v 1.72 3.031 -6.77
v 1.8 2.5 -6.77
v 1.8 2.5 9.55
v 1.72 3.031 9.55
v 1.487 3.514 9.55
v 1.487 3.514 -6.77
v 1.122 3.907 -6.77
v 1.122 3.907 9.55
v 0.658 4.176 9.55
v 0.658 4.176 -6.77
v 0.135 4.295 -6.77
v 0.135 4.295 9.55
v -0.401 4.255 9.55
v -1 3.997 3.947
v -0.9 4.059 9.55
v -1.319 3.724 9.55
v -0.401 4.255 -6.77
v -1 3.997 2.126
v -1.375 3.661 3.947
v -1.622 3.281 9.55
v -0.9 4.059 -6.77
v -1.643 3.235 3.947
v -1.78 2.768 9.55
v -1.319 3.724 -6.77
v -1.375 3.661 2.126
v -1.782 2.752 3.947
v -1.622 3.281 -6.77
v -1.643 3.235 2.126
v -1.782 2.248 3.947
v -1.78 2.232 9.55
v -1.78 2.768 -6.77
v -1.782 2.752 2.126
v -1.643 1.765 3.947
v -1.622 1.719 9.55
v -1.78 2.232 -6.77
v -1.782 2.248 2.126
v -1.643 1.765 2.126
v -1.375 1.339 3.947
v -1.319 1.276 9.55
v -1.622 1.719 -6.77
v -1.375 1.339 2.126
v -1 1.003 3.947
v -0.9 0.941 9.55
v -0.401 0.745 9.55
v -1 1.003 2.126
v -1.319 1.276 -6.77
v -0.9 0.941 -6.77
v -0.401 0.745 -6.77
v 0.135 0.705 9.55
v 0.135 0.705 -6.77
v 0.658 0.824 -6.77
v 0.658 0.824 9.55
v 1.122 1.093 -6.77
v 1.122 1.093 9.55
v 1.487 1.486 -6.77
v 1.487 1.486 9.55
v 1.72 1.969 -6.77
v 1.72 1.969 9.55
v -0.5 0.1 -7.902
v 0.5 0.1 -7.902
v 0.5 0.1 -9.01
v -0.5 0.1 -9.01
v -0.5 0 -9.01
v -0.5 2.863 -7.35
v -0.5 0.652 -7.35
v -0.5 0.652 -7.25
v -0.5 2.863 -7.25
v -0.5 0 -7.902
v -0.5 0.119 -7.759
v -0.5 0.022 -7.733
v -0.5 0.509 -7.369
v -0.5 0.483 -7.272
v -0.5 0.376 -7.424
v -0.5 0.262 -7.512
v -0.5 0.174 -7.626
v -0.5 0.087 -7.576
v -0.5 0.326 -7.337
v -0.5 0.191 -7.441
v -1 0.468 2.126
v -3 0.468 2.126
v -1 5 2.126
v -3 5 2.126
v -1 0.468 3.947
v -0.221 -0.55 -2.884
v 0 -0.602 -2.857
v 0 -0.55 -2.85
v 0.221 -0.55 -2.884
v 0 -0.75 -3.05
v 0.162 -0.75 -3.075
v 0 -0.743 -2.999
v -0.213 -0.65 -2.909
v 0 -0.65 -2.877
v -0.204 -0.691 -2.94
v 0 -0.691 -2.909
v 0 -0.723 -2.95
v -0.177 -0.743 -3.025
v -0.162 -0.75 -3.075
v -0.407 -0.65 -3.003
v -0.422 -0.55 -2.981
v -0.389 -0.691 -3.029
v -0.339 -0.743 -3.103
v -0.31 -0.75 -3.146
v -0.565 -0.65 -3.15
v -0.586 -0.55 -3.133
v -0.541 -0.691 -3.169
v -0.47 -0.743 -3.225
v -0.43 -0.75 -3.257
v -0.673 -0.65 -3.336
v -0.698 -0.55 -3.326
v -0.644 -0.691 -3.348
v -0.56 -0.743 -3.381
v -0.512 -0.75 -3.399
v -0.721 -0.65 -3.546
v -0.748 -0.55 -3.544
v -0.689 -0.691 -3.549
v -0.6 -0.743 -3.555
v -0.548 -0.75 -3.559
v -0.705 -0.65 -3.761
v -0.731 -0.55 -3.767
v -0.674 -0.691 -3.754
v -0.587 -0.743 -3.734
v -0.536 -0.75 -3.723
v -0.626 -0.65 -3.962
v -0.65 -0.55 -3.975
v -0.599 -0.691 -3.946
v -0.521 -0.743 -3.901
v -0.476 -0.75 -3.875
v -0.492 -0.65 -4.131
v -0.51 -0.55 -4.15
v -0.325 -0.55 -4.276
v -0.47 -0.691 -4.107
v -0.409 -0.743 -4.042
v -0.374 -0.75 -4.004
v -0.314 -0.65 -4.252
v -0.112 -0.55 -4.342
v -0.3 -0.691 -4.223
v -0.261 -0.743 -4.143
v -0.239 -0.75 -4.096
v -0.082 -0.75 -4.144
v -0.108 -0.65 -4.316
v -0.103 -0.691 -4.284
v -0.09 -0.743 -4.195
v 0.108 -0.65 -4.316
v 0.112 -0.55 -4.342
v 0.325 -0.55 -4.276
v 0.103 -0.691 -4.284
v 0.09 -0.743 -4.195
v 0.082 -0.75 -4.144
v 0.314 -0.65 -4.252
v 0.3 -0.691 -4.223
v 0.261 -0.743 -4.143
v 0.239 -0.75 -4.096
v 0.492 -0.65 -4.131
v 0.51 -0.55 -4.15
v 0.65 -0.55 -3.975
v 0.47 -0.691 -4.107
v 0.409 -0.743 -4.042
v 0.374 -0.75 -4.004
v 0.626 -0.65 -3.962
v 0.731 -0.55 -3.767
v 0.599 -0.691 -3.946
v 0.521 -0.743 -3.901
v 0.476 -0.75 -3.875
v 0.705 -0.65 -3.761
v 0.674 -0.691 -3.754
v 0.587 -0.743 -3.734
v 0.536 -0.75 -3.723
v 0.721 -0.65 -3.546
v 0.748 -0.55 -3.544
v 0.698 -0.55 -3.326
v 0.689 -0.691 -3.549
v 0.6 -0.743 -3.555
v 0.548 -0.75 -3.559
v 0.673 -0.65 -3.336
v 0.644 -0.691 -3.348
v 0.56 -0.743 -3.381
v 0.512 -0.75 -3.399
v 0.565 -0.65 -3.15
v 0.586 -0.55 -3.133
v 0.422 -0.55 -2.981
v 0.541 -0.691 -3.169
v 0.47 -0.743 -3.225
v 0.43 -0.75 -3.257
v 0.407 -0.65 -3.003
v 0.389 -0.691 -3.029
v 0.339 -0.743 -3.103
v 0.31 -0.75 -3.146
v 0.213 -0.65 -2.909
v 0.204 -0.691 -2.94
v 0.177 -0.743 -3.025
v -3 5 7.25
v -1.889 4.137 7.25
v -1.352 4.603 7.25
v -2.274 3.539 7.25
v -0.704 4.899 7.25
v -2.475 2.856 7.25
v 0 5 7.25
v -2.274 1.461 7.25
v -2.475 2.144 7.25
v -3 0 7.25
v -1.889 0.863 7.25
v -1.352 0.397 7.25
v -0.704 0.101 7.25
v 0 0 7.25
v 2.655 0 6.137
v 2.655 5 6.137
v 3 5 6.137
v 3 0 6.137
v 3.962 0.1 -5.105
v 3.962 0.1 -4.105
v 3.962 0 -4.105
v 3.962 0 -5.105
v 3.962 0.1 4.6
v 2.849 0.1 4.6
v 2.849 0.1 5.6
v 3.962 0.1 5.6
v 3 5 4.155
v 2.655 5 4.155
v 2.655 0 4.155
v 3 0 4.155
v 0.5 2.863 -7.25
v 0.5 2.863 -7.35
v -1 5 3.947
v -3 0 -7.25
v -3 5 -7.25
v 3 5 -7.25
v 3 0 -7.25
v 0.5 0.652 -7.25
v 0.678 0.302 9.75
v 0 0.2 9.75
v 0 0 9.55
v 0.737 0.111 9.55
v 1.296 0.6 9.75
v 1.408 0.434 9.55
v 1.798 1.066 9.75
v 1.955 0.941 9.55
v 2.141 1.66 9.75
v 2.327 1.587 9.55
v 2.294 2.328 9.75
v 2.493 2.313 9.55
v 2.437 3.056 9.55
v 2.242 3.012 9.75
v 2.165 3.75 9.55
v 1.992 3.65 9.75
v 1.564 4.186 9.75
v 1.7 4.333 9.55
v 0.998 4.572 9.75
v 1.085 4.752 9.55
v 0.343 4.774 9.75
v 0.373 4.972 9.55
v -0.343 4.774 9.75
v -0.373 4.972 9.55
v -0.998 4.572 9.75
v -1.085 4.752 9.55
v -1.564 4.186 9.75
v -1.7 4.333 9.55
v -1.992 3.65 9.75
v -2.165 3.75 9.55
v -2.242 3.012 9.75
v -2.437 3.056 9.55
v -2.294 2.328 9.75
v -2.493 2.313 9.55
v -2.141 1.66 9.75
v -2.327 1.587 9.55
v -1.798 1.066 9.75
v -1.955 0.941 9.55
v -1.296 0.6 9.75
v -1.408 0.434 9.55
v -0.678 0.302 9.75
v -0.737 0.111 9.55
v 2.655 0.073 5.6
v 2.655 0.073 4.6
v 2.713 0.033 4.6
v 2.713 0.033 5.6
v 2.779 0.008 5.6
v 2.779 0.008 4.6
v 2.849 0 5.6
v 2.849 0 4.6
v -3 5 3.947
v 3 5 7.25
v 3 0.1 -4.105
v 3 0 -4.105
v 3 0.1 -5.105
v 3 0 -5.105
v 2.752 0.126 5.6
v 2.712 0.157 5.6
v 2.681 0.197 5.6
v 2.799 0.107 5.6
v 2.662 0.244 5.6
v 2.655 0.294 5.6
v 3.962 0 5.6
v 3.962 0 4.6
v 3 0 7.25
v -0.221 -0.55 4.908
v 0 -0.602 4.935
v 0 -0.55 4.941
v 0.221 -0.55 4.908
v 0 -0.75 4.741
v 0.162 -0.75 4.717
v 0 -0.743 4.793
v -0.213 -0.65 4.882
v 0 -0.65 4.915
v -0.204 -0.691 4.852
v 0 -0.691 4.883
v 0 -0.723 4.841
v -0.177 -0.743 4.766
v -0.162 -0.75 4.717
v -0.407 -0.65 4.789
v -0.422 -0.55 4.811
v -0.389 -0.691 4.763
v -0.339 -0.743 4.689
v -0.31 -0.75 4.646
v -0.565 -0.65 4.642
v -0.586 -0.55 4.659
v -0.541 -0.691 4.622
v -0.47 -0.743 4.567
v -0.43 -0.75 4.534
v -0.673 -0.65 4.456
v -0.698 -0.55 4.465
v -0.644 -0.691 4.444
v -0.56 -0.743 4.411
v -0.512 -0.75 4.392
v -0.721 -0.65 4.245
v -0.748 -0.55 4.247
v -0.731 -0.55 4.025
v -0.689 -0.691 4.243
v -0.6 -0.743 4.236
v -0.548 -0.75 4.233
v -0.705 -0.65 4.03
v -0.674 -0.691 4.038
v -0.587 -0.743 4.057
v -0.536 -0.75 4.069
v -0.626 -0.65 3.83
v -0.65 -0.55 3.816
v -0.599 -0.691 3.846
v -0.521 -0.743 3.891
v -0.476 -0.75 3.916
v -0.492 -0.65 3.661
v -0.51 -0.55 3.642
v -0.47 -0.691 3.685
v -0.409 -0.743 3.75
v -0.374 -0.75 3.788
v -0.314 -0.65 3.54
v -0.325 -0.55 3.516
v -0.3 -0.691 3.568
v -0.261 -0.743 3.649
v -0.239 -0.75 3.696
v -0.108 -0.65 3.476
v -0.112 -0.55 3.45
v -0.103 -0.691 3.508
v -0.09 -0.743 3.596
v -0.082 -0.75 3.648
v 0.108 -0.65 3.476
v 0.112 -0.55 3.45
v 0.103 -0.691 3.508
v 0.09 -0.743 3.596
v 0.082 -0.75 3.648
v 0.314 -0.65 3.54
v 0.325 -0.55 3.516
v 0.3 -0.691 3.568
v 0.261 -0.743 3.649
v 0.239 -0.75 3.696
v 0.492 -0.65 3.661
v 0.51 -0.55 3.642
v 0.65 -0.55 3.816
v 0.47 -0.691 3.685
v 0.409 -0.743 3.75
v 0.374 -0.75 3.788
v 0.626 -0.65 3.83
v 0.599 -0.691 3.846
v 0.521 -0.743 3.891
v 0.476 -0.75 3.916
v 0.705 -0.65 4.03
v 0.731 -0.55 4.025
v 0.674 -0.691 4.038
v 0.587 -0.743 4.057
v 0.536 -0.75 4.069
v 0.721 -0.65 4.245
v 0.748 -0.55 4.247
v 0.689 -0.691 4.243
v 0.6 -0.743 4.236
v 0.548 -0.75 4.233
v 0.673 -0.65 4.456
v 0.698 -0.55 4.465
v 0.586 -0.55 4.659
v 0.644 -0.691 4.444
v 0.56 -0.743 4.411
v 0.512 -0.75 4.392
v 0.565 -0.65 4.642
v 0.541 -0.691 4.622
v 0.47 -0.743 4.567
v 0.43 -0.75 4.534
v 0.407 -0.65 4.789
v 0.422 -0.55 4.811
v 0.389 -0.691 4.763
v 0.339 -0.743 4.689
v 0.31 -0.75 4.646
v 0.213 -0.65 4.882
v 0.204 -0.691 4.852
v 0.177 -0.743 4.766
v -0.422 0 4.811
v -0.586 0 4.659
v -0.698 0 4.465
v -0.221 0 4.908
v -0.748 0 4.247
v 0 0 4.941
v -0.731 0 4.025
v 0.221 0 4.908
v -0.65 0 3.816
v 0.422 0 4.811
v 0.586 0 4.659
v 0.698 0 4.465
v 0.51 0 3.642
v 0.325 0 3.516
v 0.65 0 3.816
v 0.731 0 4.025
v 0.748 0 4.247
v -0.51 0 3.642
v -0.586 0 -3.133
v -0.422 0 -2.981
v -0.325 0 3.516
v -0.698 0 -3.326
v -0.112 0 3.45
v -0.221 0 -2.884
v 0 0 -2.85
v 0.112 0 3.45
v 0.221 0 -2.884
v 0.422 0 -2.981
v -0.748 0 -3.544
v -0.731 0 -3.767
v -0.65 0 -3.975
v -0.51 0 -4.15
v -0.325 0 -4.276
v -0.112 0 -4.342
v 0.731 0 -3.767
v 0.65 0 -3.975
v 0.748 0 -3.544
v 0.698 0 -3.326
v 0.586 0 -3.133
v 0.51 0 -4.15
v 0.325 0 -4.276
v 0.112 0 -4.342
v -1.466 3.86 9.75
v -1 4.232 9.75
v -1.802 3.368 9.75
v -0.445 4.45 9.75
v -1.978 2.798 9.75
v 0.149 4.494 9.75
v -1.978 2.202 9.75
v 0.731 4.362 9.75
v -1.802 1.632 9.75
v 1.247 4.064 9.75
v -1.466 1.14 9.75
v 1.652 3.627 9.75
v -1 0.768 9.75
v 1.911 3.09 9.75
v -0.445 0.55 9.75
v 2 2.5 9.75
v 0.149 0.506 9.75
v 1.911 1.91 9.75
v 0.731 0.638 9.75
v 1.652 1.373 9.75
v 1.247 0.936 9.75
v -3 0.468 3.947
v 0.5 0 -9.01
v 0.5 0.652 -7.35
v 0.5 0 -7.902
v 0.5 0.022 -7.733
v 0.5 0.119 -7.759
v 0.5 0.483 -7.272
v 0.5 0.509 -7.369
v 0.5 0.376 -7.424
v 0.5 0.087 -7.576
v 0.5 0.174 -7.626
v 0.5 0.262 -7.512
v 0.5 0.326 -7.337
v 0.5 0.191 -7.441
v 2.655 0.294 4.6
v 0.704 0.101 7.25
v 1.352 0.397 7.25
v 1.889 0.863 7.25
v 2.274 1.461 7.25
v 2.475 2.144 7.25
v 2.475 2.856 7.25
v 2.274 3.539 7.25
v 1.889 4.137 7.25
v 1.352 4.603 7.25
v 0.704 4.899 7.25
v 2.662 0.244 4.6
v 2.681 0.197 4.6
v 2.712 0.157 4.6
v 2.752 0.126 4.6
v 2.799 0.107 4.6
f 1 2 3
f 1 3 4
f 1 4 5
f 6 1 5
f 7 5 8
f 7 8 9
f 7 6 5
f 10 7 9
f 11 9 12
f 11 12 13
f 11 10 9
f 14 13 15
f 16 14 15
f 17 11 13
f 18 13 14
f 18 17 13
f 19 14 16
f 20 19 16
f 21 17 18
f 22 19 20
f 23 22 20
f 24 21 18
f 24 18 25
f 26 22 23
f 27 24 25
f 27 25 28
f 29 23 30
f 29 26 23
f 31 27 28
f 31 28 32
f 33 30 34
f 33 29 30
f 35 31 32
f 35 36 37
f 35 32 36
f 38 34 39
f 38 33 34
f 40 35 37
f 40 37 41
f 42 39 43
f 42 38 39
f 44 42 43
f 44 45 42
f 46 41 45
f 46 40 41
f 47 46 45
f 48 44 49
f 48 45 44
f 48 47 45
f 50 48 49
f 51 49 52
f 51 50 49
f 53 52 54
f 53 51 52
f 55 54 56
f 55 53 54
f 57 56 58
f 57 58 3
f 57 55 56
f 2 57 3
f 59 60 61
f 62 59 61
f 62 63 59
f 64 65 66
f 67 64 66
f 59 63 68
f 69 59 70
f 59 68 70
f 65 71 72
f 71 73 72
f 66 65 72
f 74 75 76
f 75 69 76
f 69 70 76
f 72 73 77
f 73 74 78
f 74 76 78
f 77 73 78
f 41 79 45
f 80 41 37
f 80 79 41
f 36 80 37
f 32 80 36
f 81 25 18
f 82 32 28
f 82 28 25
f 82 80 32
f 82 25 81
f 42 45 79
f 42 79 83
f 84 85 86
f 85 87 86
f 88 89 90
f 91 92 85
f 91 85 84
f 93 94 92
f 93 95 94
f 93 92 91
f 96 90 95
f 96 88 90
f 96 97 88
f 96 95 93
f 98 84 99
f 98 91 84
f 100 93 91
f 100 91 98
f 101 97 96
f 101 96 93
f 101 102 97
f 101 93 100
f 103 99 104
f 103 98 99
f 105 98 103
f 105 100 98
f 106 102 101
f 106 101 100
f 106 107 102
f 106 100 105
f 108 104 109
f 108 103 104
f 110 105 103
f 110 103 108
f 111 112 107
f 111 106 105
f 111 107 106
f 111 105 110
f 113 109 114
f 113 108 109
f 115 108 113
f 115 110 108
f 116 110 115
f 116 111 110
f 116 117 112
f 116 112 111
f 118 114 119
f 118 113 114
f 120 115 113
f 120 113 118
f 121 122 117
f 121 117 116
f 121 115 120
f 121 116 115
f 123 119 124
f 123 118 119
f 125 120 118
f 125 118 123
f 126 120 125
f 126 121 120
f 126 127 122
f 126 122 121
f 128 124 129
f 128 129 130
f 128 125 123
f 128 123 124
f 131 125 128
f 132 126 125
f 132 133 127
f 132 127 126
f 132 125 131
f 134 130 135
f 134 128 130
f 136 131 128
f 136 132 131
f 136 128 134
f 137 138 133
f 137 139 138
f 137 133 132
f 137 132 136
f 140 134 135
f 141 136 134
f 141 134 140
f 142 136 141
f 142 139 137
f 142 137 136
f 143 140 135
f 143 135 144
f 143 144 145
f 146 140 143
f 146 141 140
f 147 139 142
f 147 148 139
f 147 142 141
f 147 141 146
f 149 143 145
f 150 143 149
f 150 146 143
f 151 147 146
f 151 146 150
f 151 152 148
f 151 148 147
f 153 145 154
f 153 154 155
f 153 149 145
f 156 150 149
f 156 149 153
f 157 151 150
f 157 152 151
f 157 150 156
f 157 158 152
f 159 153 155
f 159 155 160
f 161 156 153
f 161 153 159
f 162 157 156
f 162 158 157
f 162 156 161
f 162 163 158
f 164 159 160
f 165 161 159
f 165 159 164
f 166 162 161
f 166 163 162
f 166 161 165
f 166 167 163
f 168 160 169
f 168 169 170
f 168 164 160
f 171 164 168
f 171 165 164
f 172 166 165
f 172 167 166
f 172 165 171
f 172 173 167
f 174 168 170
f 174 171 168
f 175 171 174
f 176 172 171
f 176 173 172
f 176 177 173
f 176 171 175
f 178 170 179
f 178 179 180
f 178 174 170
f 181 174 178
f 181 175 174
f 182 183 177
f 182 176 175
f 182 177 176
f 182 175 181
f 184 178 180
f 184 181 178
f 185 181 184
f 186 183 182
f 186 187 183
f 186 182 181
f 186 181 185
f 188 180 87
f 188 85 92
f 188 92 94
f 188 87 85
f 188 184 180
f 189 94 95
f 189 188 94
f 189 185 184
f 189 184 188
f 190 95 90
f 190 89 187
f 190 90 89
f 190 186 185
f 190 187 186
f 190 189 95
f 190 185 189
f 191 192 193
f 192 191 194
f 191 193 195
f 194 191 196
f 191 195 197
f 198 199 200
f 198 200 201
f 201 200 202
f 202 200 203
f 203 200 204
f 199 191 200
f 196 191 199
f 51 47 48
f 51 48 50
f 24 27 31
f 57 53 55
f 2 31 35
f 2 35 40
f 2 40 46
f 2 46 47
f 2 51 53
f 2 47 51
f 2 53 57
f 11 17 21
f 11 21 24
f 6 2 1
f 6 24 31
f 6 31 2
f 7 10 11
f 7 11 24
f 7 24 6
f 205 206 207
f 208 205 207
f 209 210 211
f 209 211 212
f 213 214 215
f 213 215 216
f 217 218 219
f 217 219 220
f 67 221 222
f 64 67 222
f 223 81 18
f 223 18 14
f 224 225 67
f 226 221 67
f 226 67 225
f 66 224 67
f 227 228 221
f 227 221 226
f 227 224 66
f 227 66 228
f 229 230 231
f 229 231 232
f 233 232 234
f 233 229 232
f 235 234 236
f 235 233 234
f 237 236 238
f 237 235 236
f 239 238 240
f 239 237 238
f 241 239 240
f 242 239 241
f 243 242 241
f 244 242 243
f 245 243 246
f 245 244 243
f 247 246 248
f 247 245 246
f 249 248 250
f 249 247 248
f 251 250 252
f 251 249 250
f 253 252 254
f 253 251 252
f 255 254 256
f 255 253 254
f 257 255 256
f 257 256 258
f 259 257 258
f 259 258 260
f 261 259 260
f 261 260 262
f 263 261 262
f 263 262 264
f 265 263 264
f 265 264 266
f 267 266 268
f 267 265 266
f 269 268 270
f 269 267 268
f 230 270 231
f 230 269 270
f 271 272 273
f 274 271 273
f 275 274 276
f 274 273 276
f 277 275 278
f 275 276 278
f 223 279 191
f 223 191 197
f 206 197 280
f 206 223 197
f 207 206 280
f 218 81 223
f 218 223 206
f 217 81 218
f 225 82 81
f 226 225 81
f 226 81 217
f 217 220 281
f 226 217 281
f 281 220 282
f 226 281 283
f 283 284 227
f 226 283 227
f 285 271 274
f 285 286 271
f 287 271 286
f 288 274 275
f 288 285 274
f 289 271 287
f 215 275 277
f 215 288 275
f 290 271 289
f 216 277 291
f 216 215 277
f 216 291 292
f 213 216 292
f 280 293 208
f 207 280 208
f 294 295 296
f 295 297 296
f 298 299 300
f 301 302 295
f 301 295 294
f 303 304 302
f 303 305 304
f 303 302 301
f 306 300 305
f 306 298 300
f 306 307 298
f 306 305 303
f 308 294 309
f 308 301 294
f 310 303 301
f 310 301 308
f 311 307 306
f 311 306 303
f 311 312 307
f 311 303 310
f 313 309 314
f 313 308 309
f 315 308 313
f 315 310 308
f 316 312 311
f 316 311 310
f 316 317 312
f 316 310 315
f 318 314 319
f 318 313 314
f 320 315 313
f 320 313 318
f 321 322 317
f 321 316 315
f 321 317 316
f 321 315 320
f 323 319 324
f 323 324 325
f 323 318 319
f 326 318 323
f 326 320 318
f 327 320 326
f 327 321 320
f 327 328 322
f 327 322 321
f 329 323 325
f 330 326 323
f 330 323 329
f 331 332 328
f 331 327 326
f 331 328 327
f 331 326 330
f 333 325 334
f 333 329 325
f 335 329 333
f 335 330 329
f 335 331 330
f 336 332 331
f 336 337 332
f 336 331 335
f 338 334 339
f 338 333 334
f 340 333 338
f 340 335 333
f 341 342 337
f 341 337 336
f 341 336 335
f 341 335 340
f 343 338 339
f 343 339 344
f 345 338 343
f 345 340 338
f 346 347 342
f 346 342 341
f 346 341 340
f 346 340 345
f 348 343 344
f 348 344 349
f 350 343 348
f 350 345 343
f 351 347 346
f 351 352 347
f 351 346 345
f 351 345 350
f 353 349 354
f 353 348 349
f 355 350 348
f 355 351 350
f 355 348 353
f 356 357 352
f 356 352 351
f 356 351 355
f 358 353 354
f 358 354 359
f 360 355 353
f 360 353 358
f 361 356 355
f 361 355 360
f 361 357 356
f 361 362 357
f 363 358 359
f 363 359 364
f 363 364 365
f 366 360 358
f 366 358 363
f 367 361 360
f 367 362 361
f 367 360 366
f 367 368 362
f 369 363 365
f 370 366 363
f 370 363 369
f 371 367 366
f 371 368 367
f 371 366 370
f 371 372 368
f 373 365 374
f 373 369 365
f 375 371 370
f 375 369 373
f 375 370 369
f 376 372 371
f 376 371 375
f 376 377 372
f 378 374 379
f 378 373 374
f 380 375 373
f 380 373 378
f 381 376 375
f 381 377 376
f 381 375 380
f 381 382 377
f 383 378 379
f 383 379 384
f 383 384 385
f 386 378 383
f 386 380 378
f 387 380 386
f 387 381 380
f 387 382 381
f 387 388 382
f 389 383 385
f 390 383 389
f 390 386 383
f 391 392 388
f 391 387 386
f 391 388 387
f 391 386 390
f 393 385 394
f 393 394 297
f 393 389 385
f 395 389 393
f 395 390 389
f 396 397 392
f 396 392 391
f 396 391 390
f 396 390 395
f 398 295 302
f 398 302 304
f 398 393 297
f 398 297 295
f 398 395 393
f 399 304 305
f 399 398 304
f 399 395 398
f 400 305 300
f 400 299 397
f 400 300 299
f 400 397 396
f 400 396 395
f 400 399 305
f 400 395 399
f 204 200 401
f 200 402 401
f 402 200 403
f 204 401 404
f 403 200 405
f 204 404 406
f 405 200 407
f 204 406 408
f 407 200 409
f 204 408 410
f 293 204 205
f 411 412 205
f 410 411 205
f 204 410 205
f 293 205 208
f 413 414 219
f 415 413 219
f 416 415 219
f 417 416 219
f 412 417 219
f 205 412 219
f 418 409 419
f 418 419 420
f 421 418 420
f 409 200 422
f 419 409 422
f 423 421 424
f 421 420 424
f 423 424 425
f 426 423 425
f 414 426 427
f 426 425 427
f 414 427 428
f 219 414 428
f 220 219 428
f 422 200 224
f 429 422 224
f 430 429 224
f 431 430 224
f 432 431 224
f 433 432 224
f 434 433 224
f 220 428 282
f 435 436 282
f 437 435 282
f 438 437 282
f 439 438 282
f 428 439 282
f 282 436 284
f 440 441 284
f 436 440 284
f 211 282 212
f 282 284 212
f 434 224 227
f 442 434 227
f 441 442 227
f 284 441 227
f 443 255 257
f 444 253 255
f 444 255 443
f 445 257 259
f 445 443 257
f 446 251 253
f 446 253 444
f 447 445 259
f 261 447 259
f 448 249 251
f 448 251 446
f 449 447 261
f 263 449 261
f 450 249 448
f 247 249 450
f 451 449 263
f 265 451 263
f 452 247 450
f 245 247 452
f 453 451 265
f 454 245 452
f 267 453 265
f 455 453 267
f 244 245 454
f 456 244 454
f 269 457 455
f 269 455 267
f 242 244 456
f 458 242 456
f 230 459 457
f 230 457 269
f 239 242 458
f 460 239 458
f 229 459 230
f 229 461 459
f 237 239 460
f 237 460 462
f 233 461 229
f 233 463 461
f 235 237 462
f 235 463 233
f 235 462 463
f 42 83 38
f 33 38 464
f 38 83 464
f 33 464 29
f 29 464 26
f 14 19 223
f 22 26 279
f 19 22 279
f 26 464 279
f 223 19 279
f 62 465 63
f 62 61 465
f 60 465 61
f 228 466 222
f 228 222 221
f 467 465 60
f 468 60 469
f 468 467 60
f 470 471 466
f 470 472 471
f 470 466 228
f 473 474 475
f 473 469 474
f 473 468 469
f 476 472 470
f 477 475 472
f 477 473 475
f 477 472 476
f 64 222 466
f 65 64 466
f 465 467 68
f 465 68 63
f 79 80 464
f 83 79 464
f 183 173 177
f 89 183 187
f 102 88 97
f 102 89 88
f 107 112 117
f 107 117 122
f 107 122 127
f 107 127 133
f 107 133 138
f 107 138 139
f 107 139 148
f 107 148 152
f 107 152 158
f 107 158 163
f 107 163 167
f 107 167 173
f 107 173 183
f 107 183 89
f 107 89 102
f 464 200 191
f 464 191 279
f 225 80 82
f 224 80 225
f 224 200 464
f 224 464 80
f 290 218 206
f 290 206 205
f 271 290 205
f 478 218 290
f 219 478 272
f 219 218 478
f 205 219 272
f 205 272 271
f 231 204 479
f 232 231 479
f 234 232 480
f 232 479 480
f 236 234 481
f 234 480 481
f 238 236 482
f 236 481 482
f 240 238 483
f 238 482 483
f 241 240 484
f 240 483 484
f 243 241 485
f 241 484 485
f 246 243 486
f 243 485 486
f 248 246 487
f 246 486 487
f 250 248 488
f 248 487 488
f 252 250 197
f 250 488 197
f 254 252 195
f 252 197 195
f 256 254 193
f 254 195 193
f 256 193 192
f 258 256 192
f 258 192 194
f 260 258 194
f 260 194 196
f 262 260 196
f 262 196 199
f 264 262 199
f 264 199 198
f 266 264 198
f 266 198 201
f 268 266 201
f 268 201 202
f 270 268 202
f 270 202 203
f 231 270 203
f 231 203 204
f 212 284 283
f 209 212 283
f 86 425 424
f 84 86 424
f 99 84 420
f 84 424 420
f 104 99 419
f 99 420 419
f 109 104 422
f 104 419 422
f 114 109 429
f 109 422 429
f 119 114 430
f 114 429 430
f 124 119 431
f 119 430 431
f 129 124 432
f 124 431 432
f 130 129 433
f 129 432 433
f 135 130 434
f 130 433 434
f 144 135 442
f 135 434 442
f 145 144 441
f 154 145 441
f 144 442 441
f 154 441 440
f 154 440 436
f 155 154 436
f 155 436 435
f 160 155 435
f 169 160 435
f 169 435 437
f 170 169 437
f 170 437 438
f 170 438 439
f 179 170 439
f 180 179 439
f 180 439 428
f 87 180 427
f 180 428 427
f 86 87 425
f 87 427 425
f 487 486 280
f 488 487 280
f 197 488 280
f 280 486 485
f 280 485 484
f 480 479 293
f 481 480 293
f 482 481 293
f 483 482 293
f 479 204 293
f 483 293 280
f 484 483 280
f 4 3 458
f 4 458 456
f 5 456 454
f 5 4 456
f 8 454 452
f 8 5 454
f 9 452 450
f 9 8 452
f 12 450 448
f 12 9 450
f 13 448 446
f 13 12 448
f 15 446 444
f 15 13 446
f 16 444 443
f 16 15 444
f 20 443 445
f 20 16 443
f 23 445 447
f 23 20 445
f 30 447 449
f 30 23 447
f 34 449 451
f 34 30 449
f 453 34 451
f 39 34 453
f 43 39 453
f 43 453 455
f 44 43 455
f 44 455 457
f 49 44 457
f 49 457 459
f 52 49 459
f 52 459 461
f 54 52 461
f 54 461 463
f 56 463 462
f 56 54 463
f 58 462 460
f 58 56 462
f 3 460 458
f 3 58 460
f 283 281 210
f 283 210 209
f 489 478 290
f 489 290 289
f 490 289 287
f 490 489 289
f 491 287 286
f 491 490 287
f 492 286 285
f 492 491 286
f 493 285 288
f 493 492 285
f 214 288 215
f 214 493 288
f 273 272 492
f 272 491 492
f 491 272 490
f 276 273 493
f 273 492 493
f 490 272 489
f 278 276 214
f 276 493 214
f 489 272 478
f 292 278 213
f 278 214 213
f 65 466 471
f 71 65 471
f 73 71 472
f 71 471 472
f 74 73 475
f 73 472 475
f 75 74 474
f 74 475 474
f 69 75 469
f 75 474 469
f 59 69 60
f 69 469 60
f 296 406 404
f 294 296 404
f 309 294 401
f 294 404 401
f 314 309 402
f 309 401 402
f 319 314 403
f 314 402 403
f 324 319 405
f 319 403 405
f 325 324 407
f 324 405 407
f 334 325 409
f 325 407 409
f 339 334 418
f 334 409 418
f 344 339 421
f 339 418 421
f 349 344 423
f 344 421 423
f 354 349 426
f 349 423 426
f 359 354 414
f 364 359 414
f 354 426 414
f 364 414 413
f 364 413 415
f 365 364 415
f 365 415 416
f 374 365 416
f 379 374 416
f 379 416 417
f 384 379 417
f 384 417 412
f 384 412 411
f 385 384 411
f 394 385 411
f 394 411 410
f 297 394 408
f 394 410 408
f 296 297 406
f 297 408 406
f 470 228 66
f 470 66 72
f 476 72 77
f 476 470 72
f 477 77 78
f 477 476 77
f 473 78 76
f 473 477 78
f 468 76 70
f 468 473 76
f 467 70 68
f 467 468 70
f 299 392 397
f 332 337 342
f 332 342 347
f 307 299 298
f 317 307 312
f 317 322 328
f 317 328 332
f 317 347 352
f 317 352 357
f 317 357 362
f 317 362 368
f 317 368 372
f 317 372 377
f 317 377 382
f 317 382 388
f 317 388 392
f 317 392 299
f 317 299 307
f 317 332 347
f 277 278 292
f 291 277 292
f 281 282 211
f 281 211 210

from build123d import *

# Parameters (mm, degrees)
SKETCH2_W                = 6
SKETCH2_H                = 14.5
BOSS_EXTRUDE1_DEPTH      = 5
SKETCH3_R                = 2.5
SKETCH3_R_2              = 1.8
BOSS_EXTRUDE2_DEPTH      = 2.5
CHAMFER2_SIZE            = 0.2
CHAMFER3_SIZE            = 0.2
SKETCH4_R                = 1.8
CUT_EXTRUDE1_DEPTH       = 14.02
SKETCH5_R                = 0.75
BOSS_EXTRUDE3_DEPTH      = 0.75
FILLET1_R                = 0.2
SKETCH7_W                = 0.344908333
SKETCH7_H                = 1.981698852
CUT_EXTRUDE2_DEPTH       = 12.710038429
SURFACE_EXTRUDE1_1_BACK  = 0.5
SURFACE_EXTRUDE1_1_DEPTH = 1
THICKEN1_T1              = 0.1
SKETCH9_W                = 1
SKETCH9_H                = 0.1
BOSS_EXTRUDE4_DEPTH      = 0.961518788
SURFACE_EXTRUDE2_2_BACK  = 0.5
SURFACE_EXTRUDE2_2_DEPTH = 1
THICKEN2_T2              = 0.1
SKETCH11_W               = 1.821073917
SKETCH11_H               = 5.660094607
CUT_EXTRUDE3_DEPTH       = 2


with BuildPart() as part:
    # Sketch2 → Boss-Extrude1 (new body)
    with BuildSketch(Plane(origin=(0, 0, 0), x_dir=(1, 0, 0), z_dir=(0, 1, 0))):
        Rectangle(SKETCH2_W, SKETCH2_H)
    extrude(amount=BOSS_EXTRUDE1_DEPTH)

    # Sketch3 → Boss-Extrude2 (add)
    with BuildSketch(Plane.XY.offset(7.25)):
        with Locations(Location((0, 2.5, 0), (0, 0, 270))):
            Circle(SKETCH3_R)
        with Locations((0, 2.5)):
            Circle(SKETCH3_R_2, mode=Mode.SUBTRACT)
    extrude(amount=BOSS_EXTRUDE2_DEPTH)

    # Chamfer2
    chamfer2_edges = [part.edges().sort_by_distance(p)[0] for p in [
        (0, 5, 9.75),
    ]]
    chamfer(chamfer2_edges, length=CHAMFER2_SIZE)

    # Chamfer3
    chamfer3_edges = [part.edges().sort_by_distance(p)[0] for p in [
        (-1.8, 2.5, 9.75),
    ]]
    chamfer(chamfer3_edges, length=CHAMFER3_SIZE)

    # Sketch4 → Cut-Extrude1 (cut)
    with BuildSketch(Plane.XY.offset(7.25)):
        with Locations((0, 2.5)):
            Circle(SKETCH4_R)
    extrude(amount=-CUT_EXTRUDE1_DEPTH, mode=Mode.SUBTRACT)

    # Sketch5 → Boss-Extrude3 (add)
    with BuildSketch(Plane.XZ):
        with Locations(Location((0, 4.191398765, 0), (0, 0, 90))):
            Circle(SKETCH5_R)
        with Locations(Location((0, -3.600413433, 0), (0, 0, 90))):
            Circle(SKETCH5_R)
    extrude(amount=BOSS_EXTRUDE3_DEPTH)

    # Fillet1
    fillet1_edges = [part.edges().sort_by_distance(p)[0] for p in [
        (0, -0.75, 3.441398765),
        (0, -0.75, -4.350413433),
    ]]
    fillet(fillet1_edges, radius=FILLET1_R)

    # Sketch7 → Cut-Extrude2 (cut, through all)
    with BuildSketch(Plane(origin=(0, 5, 0), x_dir=(1, 0, 0), z_dir=(0, 1, 0))):
        with Locations((2.827545834, -5.146058424)):
            Rectangle(SKETCH7_W, SKETCH7_H)
    extrude(amount=-CUT_EXTRUDE2_DEPTH, mode=Mode.SUBTRACT)

    # Surface-Extrude1: a surface, the sketch's curves swept straight by 1 mm
    with BuildLine(Plane.XY.offset(5.1).offset(-SURFACE_EXTRUDE1_1_BACK), mode=Mode.PRIVATE) as surface_extrude1_1_path:
        Line((2.555091667, 0.638024488), (2.555091667, 0.294273869))
        ThreePointArc((2.555091667, 0.294273869), (2.641282487, 0.086190821), (2.849365536, 0))
        Line((2.849365536, 0), (3.961518788, 0))
    surface_extrude1_1 = Shell.extrude(surface_extrude1_1_path.wire(), (0 * SURFACE_EXTRUDE1_1_DEPTH, 0 * SURFACE_EXTRUDE1_1_DEPTH, 1 * SURFACE_EXTRUDE1_1_DEPTH))
    add(Solid.thicken(surface_extrude1_1, THICKEN1_T1))

    # Sketch9 → Boss-Extrude4 (add)
    with BuildSketch(Plane(origin=(3, 0, 0), x_dir=(0, 0, -1), z_dir=(1, 0, 0))):
        with Locations((4.604659924, 0.05)):
            Rectangle(SKETCH9_W, SKETCH9_H)
    extrude(amount=BOSS_EXTRUDE4_DEPTH)

    # Surface-Extrude2: a surface, the sketch's curves swept straight by 1 mm
    with BuildLine(Plane.ZY.offset(-SURFACE_EXTRUDE2_2_BACK), mode=Mode.PRIVATE) as surface_extrude2_2_path:
        Line((-7.25, 2.862656565), (-7.25, 0.652010512))
        ThreePointArc((-7.25, 0.652010512), (-7.440969458, 0.190969458), (-7.902010512, 0))
        Line((-7.902010512, 0), (-9.009741204, 0))
    surface_extrude2_2 = Shell.extrude(surface_extrude2_2_path.wire(), (-1 * SURFACE_EXTRUDE2_2_DEPTH, 0 * SURFACE_EXTRUDE2_2_DEPTH, 0 * SURFACE_EXTRUDE2_2_DEPTH))
    add(Solid.thicken(surface_extrude2_2, -THICKEN2_T2))

    # Sketch11 → Cut-Extrude3 (cut)
    with BuildSketch(Plane.ZY.offset(3)):
        with Locations((3.036115989, 3.2980341)):
            Rectangle(SKETCH11_W, SKETCH11_H)
    extrude(amount=-CUT_EXTRUDE3_DEPTH, mode=Mode.SUBTRACT)


solid = part.part
